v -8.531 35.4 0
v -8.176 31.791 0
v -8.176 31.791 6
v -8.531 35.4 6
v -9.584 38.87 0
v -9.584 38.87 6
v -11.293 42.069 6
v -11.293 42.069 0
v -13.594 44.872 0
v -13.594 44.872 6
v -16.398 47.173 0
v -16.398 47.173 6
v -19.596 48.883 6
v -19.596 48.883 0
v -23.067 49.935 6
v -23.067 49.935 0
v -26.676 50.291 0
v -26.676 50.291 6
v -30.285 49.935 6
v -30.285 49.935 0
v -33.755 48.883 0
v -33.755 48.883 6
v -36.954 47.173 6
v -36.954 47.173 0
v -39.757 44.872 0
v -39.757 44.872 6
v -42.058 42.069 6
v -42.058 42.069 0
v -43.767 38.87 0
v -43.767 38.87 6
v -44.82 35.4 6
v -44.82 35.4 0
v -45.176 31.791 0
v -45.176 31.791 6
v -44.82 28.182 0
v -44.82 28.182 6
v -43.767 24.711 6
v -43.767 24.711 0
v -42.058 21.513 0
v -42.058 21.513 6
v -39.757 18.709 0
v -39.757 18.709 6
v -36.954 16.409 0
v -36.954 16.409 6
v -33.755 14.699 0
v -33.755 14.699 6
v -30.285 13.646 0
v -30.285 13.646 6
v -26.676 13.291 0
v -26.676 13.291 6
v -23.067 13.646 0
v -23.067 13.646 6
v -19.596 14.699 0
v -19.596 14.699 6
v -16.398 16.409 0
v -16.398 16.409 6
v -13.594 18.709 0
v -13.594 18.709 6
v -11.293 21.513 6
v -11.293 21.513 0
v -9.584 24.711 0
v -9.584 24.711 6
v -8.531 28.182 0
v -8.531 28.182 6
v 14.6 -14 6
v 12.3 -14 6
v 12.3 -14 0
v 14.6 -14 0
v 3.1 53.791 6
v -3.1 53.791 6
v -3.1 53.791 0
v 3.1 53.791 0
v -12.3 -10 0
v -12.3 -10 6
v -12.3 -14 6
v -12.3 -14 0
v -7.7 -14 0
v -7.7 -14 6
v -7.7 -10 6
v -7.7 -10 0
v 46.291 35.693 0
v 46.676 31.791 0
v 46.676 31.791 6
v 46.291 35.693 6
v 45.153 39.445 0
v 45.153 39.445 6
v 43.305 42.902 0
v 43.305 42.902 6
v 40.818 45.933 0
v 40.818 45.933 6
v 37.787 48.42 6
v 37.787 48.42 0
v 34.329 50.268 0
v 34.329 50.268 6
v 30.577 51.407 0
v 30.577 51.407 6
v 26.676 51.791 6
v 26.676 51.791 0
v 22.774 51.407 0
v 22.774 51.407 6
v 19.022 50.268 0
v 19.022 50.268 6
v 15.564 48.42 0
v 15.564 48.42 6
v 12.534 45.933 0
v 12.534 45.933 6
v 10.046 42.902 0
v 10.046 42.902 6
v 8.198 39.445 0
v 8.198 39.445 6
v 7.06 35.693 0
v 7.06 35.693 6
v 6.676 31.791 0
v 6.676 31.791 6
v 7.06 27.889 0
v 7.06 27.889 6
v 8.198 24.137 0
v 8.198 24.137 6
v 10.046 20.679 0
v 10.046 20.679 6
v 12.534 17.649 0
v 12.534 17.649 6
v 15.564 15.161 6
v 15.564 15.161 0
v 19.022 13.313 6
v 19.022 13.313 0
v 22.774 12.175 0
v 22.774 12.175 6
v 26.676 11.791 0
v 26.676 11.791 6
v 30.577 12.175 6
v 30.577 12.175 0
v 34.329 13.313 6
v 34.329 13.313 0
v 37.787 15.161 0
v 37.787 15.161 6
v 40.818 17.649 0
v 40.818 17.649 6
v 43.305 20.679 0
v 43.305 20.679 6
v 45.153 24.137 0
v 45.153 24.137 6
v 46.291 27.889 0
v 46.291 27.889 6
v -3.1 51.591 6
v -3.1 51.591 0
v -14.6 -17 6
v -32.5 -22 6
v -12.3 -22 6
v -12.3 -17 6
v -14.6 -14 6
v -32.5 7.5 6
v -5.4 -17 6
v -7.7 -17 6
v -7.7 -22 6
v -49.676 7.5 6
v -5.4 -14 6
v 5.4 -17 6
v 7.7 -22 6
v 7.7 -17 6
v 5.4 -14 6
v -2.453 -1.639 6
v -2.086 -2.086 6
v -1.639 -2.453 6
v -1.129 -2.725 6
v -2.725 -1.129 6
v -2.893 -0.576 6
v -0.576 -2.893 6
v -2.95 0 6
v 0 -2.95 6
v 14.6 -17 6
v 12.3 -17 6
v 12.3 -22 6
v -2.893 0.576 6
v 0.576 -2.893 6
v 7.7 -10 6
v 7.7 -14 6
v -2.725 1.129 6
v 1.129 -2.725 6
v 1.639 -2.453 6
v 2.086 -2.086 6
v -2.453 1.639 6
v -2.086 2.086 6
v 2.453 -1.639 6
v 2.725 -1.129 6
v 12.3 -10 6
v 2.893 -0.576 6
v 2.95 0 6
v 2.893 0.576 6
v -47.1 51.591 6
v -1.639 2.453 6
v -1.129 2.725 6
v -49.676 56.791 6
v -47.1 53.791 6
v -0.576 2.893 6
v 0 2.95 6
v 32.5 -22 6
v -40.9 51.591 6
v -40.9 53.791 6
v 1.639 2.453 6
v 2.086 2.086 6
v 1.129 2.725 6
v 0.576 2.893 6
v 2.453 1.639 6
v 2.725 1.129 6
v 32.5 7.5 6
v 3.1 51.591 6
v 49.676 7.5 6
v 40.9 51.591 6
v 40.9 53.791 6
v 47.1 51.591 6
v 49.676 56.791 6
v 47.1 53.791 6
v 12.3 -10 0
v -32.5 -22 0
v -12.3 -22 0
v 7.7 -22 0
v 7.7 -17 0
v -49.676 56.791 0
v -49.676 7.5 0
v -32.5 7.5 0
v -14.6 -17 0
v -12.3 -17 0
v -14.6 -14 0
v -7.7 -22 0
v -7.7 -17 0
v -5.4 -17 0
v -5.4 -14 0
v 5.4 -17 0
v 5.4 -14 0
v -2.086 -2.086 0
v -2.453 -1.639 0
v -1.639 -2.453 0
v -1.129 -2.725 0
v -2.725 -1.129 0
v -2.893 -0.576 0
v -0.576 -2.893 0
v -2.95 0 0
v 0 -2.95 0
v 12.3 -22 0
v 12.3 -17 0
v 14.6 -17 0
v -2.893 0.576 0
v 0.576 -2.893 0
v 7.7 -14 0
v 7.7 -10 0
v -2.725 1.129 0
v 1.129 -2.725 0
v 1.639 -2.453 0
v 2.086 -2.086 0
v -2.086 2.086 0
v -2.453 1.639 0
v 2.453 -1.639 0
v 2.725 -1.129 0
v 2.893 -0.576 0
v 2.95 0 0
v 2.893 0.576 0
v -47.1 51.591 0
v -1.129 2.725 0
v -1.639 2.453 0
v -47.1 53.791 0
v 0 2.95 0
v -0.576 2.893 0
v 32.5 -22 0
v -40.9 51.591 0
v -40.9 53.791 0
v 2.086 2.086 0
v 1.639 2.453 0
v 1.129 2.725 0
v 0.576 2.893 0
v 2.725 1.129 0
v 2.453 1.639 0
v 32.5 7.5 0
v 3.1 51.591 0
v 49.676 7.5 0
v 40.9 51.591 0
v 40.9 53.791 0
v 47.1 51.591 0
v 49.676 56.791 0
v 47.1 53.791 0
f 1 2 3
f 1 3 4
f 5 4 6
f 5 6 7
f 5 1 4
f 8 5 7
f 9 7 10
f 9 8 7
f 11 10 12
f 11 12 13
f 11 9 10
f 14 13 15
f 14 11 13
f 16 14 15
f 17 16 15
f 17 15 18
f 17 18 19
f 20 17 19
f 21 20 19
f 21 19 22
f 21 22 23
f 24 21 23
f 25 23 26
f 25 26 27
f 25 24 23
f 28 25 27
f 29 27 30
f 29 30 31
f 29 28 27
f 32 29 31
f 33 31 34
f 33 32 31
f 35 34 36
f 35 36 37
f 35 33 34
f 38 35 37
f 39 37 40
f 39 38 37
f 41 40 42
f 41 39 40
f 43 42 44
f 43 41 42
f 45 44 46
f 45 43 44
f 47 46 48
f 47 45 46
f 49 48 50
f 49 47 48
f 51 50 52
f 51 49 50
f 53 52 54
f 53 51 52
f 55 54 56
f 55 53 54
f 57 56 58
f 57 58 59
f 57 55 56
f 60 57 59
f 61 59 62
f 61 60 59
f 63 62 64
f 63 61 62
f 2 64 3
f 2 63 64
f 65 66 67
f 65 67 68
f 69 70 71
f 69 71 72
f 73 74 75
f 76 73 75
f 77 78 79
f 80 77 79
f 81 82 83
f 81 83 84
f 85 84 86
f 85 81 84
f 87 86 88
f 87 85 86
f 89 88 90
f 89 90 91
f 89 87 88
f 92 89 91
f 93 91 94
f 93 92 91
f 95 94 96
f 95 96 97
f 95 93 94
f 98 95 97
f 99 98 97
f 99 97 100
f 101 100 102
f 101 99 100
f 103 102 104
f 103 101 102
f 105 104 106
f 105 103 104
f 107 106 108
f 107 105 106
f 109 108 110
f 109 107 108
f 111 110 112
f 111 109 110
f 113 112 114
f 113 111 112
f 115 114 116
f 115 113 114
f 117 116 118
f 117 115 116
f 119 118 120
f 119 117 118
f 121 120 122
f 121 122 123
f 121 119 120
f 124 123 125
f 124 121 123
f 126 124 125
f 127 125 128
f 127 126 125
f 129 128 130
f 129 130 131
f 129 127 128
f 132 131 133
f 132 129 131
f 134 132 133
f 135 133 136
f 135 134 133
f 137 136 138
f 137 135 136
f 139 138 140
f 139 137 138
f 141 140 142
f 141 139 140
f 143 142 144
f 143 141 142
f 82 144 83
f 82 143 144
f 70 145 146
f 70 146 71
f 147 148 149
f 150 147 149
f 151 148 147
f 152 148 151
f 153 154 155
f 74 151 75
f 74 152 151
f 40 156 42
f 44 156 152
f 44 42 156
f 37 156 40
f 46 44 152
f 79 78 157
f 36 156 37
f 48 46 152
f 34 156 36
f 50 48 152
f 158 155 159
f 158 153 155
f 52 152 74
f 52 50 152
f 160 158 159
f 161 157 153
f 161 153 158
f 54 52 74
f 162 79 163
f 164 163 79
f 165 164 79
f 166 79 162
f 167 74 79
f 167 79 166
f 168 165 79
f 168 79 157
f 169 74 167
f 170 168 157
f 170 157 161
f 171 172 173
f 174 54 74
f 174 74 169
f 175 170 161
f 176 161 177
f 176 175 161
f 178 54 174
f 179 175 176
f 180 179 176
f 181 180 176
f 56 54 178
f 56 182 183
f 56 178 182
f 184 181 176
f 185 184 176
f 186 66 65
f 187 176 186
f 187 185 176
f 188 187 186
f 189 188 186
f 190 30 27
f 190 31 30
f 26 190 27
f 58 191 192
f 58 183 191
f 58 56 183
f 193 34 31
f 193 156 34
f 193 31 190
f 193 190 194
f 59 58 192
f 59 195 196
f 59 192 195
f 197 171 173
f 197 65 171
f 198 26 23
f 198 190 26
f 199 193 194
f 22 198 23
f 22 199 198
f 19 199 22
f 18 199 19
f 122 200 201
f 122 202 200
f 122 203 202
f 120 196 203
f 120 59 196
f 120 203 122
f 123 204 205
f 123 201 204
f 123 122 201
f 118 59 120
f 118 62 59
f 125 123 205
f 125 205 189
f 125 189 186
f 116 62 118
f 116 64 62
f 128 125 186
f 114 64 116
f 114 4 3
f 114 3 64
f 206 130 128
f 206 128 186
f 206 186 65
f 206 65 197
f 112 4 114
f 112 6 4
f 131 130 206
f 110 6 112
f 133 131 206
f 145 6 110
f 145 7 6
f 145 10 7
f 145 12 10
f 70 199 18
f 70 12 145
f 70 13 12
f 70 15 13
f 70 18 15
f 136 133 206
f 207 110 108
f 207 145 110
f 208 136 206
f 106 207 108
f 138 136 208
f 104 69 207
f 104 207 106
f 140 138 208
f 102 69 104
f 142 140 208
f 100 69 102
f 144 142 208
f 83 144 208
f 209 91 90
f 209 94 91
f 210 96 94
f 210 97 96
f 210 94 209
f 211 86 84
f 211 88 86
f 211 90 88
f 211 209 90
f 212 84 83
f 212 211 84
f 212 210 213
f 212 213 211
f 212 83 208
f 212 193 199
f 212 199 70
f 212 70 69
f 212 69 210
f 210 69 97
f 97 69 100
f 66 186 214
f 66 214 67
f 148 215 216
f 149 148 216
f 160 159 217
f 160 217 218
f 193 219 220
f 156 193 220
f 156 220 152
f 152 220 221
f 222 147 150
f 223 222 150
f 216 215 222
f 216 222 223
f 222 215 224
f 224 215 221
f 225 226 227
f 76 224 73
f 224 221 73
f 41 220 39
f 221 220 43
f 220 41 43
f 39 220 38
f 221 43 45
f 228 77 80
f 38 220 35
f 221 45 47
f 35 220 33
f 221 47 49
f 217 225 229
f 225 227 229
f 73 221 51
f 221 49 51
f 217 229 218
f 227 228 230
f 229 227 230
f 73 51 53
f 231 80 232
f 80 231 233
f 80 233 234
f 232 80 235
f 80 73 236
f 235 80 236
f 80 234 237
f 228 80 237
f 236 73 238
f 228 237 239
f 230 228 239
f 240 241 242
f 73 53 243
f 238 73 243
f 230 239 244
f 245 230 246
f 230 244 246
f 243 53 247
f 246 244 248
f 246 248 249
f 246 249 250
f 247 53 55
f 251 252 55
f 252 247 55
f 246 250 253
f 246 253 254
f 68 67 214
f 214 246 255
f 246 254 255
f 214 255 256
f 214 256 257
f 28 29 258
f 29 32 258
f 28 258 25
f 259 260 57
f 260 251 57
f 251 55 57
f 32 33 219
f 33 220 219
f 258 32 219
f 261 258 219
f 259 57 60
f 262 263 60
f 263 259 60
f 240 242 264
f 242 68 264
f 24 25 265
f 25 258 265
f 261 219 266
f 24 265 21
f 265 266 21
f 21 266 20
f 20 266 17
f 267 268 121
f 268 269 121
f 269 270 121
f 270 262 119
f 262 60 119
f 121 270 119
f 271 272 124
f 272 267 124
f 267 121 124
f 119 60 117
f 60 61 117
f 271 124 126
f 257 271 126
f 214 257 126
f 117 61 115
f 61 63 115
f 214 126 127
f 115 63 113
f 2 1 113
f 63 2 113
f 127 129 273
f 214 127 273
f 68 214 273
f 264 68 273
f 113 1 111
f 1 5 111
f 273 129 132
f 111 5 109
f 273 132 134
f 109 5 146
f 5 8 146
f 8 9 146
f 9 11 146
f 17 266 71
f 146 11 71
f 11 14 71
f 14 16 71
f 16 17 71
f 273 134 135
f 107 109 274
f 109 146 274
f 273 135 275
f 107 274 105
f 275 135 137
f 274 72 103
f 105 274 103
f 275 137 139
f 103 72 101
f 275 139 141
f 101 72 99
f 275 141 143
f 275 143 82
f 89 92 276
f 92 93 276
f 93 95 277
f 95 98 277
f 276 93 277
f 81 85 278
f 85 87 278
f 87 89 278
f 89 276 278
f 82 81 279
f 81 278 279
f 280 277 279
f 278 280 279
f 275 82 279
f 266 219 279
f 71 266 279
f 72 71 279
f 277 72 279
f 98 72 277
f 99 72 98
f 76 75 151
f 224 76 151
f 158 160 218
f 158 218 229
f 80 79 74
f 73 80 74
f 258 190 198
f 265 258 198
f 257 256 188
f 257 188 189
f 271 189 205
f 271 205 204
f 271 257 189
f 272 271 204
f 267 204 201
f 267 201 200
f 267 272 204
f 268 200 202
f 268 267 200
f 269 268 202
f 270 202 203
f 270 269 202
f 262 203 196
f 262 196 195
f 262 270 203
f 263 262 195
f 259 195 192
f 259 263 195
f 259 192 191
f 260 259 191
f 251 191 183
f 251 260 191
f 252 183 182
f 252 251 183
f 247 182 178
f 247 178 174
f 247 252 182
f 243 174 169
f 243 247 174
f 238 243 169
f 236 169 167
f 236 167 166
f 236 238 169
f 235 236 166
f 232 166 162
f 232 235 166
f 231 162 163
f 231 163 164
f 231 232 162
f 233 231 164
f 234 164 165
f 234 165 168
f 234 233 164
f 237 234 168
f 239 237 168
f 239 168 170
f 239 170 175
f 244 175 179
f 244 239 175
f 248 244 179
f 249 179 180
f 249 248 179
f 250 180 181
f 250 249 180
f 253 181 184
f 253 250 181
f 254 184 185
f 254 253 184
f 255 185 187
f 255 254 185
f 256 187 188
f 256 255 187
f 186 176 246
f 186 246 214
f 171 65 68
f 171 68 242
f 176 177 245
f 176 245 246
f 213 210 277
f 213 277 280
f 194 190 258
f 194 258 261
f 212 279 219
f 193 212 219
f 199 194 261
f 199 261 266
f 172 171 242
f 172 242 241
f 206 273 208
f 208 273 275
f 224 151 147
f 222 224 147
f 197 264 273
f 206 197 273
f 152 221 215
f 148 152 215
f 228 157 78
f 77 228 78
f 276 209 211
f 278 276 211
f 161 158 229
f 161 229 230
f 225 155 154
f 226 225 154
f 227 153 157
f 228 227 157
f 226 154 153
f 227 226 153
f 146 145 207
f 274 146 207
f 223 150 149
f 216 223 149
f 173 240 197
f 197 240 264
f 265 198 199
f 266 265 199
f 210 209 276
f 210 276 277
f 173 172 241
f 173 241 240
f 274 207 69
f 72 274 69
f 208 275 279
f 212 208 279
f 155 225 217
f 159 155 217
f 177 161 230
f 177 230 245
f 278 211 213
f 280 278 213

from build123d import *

# Parameters (mm, degrees)
SKETCH1_R           = 2.95
SKETCH1_R_2         = 20
SKETCH1_R_3         = 18.5
BOSS_EXTRUDE1_DEPTH = 6
CUT_EXTRUDE2_DEPTH  = 76.689323992
SKETCH4_W           = 6.2
SKETCH4_H           = 2.2
CUT_EXTRUDE3_DEPTH  = 76.689323992


with BuildPart() as part:
    # Sketch1 → Boss-Extrude1 (new body)
    with BuildSketch(Plane.XY):
        Polygon((-32.5, 7.5), (-32.5, -22), (32.5, -22), (32.5, 7.5), (49.675685802, 7.5), (49.675685802, 56.790844389), (-49.675685802, 56.790844389), (-49.675685802, 7.5), align=None)
        Circle(SKETCH1_R, mode=Mode.SUBTRACT)
        with Locations((26.675685802, 31.790844389)):
            Circle(SKETCH1_R_2, mode=Mode.SUBTRACT)
        with Locations((-26.675685802, 31.790844389)):
            Circle(SKETCH1_R_3, mode=Mode.SUBTRACT)
    extrude(amount=BOSS_EXTRUDE1_DEPTH)

    # Sketch3 → Cut-Extrude2 (cut, through all)
    with BuildSketch(Plane.XY.offset(6)):
        Polygon((-12.3, -22), (-7.7, -22), (-7.7, -17), (-5.4, -17), (-5.4, -14), (-7.7, -14), (-7.7, -10), (-12.3, -10), (-12.3, -14), (-14.6, -14), (-14.6, -17), (-12.3, -17), align=None)
        Polygon((7.7, -14), (7.7, -10), (12.3, -10), (12.3, -14), (14.6, -14), (14.6, -17), (12.3, -17), (12.3, -22), (7.7, -22), (7.7, -17), (5.4, -17), (5.4, -14), align=None)
    extrude(amount=-CUT_EXTRUDE2_DEPTH, mode=Mode.SUBTRACT)

    # Sketch4 → Cut-Extrude3 (cut, through all)
    with BuildSketch(Plane.XY.offset(6)):
        with Locations((0, 52.690844389)):
            Rectangle(SKETCH4_W, SKETCH4_H)
        with Locations((44, 52.690844389)):
            Rectangle(SKETCH4_W, SKETCH4_H)
        with Locations((-44, 52.690844389)):
            Rectangle(SKETCH4_W, SKETCH4_H)
    extrude(amount=-CUT_EXTRUDE3_DEPTH, mode=Mode.SUBTRACT)


solid = part.part
